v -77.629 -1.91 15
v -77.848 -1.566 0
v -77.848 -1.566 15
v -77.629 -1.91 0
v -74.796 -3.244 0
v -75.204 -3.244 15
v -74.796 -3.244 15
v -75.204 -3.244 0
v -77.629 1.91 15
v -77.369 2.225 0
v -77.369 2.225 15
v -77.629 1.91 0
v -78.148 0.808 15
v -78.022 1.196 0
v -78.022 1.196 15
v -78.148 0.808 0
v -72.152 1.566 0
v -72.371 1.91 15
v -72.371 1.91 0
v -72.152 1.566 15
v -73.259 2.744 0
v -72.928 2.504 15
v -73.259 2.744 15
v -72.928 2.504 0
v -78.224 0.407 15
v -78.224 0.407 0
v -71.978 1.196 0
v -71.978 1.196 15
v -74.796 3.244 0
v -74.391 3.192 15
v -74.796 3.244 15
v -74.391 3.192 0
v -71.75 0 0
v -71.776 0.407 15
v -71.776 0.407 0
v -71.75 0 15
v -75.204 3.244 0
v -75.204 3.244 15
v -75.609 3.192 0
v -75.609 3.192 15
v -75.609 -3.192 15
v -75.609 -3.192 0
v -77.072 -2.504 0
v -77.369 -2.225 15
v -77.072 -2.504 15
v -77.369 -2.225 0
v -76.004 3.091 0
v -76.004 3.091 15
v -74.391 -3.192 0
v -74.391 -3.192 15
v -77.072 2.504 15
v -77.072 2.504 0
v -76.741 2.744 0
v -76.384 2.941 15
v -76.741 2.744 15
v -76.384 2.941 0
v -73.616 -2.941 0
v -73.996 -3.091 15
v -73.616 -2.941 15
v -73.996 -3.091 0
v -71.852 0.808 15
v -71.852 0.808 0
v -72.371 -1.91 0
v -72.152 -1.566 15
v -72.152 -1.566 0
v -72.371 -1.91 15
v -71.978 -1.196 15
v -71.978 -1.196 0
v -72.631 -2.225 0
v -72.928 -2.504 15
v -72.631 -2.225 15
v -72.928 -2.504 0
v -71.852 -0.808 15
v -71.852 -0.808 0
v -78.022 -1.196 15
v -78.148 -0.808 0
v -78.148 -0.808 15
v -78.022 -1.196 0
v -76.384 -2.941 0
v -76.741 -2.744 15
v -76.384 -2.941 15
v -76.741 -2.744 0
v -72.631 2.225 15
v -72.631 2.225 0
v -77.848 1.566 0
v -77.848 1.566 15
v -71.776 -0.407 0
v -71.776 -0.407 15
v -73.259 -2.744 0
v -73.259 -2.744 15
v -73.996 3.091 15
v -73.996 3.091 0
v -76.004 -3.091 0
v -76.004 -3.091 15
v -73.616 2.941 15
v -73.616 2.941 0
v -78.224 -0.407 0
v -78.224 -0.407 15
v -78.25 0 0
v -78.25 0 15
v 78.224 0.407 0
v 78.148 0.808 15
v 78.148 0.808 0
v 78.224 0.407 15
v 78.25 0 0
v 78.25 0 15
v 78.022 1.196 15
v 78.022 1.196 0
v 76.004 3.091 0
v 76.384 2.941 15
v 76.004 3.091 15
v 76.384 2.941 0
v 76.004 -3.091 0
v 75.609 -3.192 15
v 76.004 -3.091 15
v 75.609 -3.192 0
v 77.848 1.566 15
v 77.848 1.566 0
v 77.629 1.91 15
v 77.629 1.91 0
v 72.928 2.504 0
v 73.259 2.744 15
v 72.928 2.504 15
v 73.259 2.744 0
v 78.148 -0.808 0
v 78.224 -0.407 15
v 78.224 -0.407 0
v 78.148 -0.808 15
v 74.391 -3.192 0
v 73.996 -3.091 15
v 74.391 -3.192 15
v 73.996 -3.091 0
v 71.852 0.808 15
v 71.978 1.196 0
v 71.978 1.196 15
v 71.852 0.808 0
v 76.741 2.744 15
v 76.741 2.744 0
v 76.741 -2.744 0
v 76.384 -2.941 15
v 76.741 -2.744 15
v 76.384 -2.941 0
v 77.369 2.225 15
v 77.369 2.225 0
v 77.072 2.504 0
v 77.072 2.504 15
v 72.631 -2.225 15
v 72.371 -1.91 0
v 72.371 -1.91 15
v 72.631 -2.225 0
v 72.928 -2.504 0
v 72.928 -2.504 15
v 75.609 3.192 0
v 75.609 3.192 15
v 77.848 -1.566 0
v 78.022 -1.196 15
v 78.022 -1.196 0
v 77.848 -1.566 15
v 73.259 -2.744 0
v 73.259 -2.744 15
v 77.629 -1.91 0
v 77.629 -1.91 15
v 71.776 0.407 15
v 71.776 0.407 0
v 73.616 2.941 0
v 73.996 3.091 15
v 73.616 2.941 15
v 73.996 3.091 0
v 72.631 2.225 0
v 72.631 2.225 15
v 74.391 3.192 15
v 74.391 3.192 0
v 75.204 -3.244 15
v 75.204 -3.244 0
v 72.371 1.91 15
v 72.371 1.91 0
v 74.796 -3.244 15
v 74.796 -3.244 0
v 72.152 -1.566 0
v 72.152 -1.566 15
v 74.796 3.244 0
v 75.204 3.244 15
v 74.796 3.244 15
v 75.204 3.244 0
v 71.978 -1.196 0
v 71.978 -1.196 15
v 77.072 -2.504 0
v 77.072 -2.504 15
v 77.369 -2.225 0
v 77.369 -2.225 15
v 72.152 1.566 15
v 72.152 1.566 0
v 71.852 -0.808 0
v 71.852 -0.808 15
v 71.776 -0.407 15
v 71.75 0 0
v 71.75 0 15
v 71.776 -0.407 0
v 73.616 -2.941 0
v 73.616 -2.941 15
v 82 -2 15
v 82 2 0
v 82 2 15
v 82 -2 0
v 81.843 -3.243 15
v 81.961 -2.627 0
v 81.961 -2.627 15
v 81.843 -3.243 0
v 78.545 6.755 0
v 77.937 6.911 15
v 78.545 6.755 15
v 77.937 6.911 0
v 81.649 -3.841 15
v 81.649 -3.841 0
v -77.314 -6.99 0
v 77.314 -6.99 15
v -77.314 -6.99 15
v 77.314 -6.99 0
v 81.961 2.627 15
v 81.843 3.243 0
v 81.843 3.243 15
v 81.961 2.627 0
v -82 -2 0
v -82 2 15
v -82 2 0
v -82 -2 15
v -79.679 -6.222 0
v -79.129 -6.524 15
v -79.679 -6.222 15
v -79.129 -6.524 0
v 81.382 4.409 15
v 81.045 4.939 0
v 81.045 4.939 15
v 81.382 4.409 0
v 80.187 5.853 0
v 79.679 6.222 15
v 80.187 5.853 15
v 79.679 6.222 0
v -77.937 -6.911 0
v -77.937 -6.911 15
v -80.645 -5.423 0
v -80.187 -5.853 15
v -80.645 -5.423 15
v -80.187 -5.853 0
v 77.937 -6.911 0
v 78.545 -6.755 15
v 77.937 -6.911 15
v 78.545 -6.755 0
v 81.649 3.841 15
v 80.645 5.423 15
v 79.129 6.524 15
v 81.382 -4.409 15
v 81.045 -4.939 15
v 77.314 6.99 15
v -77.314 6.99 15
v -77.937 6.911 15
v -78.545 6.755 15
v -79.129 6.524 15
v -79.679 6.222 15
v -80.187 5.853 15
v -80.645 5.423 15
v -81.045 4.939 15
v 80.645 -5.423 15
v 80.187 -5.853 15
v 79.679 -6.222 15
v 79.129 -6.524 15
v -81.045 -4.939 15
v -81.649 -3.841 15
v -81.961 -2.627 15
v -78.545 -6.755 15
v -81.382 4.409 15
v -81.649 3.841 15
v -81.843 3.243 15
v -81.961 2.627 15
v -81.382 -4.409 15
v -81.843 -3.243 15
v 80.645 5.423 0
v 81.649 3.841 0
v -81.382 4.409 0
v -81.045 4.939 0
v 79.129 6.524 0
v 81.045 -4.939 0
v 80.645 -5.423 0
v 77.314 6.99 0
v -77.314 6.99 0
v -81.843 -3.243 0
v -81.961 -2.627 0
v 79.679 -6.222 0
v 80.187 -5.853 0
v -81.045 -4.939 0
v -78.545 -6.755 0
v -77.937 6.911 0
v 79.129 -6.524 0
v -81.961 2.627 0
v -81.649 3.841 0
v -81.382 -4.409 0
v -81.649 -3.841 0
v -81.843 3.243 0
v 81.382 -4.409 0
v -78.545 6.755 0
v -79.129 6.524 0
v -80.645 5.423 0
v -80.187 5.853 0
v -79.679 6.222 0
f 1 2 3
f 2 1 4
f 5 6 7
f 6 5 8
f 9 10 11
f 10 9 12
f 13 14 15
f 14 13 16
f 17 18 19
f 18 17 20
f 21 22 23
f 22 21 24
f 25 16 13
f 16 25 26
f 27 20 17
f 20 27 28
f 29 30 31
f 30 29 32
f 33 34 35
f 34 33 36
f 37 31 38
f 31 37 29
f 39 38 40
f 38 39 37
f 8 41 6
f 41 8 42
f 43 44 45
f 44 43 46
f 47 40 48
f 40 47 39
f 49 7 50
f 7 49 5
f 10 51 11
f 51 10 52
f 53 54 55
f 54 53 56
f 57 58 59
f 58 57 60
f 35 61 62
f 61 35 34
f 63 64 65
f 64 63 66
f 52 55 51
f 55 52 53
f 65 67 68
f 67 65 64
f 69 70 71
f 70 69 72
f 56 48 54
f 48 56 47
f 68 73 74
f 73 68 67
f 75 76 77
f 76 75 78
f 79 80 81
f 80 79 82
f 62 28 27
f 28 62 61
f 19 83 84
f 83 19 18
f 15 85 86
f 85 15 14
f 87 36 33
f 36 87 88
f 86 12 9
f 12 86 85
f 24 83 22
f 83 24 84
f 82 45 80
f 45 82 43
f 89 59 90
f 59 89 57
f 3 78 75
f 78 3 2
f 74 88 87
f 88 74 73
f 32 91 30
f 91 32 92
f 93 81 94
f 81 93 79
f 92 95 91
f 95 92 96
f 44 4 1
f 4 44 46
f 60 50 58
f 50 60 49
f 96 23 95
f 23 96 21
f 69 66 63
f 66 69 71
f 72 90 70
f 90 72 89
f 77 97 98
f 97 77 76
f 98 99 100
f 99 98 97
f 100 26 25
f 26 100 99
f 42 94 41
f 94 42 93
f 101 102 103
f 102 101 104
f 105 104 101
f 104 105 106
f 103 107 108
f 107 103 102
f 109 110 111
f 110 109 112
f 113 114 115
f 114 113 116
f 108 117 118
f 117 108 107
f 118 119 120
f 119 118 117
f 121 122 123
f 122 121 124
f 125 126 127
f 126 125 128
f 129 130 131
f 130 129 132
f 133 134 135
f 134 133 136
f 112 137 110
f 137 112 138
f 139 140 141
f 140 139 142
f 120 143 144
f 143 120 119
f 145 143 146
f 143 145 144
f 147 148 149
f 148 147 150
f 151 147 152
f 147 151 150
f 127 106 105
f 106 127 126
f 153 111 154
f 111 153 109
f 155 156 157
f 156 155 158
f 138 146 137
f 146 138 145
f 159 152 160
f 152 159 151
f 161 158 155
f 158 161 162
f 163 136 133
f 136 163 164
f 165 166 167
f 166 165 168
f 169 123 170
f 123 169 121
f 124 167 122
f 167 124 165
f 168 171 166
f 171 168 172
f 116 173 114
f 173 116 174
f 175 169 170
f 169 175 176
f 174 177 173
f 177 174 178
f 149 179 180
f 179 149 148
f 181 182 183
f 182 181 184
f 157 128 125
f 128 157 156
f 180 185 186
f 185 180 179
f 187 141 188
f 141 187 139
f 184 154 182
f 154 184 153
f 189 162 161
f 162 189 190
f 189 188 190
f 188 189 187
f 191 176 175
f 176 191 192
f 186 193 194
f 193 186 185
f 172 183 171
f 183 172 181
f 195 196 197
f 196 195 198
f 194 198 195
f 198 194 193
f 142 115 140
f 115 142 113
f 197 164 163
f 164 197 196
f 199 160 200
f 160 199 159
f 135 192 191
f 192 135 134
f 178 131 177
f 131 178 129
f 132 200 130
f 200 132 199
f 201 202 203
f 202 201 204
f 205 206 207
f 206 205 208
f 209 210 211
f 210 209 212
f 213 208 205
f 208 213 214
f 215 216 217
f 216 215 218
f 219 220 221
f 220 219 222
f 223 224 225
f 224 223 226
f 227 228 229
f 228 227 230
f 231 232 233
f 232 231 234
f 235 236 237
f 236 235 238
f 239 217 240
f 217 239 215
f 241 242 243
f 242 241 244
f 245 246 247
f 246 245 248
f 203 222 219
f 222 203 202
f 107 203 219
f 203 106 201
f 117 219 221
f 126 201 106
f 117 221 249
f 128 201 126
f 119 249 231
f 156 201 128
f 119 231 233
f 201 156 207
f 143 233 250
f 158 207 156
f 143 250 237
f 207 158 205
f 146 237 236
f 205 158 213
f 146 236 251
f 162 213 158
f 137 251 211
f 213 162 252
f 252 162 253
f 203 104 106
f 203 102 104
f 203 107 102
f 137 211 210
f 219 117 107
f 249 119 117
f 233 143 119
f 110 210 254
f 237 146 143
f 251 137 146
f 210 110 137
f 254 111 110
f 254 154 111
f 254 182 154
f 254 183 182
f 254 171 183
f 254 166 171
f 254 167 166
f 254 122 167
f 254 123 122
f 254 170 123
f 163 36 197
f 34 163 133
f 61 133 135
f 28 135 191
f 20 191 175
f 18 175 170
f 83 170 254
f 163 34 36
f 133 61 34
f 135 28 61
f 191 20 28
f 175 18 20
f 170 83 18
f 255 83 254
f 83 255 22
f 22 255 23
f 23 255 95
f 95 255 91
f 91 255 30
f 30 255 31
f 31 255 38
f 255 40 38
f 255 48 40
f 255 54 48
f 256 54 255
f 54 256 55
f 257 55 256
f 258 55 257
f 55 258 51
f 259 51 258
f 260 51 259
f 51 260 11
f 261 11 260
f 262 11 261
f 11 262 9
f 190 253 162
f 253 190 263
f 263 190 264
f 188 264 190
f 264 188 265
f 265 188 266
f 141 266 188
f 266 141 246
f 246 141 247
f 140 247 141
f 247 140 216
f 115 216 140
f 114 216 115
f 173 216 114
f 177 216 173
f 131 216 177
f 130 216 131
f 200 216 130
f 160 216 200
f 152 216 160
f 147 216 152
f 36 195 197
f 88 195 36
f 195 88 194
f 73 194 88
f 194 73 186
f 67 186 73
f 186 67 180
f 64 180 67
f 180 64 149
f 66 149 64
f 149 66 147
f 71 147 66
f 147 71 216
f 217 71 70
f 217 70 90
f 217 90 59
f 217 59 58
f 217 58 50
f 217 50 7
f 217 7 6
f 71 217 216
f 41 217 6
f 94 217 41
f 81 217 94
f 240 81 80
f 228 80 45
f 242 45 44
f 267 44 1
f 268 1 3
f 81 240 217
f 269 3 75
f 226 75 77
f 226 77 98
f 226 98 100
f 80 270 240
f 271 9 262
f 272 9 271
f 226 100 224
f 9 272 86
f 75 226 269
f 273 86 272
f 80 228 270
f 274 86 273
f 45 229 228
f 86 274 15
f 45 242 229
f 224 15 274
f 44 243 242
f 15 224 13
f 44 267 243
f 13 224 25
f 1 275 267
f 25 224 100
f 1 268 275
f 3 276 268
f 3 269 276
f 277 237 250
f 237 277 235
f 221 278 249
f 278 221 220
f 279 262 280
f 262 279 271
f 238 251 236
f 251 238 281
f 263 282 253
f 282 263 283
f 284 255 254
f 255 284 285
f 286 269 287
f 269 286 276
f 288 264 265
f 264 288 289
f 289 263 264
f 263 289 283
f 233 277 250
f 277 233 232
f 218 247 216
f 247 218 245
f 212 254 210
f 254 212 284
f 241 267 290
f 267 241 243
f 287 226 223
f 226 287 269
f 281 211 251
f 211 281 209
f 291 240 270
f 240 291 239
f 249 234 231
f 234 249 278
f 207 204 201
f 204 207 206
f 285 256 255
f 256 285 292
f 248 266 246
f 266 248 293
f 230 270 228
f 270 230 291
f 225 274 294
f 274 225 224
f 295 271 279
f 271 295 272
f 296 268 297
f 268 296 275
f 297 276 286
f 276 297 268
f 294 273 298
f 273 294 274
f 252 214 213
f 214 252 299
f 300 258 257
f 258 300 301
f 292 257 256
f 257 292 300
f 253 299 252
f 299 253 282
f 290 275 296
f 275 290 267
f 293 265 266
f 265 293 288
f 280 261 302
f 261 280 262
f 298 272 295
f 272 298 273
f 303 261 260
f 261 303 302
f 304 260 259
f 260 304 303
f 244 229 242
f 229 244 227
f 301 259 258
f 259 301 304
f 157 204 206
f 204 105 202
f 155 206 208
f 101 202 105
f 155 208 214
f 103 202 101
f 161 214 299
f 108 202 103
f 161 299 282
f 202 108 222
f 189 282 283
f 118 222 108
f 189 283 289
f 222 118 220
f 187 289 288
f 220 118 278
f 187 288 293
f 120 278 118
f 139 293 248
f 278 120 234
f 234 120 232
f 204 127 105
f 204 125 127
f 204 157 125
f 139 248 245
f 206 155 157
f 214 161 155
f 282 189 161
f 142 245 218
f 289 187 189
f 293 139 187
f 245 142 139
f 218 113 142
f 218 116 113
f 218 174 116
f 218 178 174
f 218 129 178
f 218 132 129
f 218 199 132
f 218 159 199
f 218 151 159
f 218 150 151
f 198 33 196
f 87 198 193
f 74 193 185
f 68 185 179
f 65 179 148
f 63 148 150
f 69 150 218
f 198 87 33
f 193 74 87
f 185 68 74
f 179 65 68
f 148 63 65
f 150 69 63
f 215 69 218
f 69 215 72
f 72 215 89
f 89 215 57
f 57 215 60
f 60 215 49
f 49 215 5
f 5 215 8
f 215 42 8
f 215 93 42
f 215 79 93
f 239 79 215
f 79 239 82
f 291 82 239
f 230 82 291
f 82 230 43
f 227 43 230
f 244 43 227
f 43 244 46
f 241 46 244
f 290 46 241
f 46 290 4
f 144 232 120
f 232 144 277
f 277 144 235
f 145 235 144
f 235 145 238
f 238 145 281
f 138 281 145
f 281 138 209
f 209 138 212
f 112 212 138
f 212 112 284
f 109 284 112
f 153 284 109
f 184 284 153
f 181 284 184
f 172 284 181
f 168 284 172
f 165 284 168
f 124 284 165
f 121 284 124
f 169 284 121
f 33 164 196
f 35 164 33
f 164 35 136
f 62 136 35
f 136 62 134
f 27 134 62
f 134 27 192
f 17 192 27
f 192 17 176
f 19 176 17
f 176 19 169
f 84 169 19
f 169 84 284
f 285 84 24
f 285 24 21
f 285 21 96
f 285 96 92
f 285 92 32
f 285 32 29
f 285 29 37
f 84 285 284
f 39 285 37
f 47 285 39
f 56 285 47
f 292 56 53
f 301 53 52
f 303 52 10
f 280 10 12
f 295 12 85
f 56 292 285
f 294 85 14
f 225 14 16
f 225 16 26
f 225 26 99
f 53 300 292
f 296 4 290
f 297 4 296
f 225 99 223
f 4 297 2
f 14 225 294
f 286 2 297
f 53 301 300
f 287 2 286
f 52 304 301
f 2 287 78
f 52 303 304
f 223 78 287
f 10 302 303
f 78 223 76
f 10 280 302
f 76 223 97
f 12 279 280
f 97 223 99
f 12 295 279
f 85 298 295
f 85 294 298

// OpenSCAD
$fn = 50;


difference() {
	union() {
		hull() {
			translate(v = [-77.0000000000, 2.0000000000, 0]) {
				cylinder(h = 15, r = 5);
			}
			translate(v = [77.0000000000, 2.0000000000, 0]) {
				cylinder(h = 15, r = 5);
			}
			translate(v = [-77.0000000000, -2.0000000000, 0]) {
				cylinder(h = 15, r = 5);
			}
			translate(v = [77.0000000000, -2.0000000000, 0]) {
				cylinder(h = 15, r = 5);
			}
		}
	}
	union() {
		translate(v = [-75.0000000000, 0.0000000000, -100.0000000000]) {
			cylinder(h = 200, r = 3.2500000000);
		}
		translate(v = [-75.0000000000, 0.0000000000, -100.0000000000]) {
			cylinder(h = 200, r = 3.2500000000);
		}
		translate(v = [75.0000000000, 0.0000000000, -100.0000000000]) {
			cylinder(h = 200, r = 3.2500000000);
		}
		translate(v = [75.0000000000, 0.0000000000, -100.0000000000]) {
			cylinder(h = 200, r = 3.2500000000);
		}
	}
}
